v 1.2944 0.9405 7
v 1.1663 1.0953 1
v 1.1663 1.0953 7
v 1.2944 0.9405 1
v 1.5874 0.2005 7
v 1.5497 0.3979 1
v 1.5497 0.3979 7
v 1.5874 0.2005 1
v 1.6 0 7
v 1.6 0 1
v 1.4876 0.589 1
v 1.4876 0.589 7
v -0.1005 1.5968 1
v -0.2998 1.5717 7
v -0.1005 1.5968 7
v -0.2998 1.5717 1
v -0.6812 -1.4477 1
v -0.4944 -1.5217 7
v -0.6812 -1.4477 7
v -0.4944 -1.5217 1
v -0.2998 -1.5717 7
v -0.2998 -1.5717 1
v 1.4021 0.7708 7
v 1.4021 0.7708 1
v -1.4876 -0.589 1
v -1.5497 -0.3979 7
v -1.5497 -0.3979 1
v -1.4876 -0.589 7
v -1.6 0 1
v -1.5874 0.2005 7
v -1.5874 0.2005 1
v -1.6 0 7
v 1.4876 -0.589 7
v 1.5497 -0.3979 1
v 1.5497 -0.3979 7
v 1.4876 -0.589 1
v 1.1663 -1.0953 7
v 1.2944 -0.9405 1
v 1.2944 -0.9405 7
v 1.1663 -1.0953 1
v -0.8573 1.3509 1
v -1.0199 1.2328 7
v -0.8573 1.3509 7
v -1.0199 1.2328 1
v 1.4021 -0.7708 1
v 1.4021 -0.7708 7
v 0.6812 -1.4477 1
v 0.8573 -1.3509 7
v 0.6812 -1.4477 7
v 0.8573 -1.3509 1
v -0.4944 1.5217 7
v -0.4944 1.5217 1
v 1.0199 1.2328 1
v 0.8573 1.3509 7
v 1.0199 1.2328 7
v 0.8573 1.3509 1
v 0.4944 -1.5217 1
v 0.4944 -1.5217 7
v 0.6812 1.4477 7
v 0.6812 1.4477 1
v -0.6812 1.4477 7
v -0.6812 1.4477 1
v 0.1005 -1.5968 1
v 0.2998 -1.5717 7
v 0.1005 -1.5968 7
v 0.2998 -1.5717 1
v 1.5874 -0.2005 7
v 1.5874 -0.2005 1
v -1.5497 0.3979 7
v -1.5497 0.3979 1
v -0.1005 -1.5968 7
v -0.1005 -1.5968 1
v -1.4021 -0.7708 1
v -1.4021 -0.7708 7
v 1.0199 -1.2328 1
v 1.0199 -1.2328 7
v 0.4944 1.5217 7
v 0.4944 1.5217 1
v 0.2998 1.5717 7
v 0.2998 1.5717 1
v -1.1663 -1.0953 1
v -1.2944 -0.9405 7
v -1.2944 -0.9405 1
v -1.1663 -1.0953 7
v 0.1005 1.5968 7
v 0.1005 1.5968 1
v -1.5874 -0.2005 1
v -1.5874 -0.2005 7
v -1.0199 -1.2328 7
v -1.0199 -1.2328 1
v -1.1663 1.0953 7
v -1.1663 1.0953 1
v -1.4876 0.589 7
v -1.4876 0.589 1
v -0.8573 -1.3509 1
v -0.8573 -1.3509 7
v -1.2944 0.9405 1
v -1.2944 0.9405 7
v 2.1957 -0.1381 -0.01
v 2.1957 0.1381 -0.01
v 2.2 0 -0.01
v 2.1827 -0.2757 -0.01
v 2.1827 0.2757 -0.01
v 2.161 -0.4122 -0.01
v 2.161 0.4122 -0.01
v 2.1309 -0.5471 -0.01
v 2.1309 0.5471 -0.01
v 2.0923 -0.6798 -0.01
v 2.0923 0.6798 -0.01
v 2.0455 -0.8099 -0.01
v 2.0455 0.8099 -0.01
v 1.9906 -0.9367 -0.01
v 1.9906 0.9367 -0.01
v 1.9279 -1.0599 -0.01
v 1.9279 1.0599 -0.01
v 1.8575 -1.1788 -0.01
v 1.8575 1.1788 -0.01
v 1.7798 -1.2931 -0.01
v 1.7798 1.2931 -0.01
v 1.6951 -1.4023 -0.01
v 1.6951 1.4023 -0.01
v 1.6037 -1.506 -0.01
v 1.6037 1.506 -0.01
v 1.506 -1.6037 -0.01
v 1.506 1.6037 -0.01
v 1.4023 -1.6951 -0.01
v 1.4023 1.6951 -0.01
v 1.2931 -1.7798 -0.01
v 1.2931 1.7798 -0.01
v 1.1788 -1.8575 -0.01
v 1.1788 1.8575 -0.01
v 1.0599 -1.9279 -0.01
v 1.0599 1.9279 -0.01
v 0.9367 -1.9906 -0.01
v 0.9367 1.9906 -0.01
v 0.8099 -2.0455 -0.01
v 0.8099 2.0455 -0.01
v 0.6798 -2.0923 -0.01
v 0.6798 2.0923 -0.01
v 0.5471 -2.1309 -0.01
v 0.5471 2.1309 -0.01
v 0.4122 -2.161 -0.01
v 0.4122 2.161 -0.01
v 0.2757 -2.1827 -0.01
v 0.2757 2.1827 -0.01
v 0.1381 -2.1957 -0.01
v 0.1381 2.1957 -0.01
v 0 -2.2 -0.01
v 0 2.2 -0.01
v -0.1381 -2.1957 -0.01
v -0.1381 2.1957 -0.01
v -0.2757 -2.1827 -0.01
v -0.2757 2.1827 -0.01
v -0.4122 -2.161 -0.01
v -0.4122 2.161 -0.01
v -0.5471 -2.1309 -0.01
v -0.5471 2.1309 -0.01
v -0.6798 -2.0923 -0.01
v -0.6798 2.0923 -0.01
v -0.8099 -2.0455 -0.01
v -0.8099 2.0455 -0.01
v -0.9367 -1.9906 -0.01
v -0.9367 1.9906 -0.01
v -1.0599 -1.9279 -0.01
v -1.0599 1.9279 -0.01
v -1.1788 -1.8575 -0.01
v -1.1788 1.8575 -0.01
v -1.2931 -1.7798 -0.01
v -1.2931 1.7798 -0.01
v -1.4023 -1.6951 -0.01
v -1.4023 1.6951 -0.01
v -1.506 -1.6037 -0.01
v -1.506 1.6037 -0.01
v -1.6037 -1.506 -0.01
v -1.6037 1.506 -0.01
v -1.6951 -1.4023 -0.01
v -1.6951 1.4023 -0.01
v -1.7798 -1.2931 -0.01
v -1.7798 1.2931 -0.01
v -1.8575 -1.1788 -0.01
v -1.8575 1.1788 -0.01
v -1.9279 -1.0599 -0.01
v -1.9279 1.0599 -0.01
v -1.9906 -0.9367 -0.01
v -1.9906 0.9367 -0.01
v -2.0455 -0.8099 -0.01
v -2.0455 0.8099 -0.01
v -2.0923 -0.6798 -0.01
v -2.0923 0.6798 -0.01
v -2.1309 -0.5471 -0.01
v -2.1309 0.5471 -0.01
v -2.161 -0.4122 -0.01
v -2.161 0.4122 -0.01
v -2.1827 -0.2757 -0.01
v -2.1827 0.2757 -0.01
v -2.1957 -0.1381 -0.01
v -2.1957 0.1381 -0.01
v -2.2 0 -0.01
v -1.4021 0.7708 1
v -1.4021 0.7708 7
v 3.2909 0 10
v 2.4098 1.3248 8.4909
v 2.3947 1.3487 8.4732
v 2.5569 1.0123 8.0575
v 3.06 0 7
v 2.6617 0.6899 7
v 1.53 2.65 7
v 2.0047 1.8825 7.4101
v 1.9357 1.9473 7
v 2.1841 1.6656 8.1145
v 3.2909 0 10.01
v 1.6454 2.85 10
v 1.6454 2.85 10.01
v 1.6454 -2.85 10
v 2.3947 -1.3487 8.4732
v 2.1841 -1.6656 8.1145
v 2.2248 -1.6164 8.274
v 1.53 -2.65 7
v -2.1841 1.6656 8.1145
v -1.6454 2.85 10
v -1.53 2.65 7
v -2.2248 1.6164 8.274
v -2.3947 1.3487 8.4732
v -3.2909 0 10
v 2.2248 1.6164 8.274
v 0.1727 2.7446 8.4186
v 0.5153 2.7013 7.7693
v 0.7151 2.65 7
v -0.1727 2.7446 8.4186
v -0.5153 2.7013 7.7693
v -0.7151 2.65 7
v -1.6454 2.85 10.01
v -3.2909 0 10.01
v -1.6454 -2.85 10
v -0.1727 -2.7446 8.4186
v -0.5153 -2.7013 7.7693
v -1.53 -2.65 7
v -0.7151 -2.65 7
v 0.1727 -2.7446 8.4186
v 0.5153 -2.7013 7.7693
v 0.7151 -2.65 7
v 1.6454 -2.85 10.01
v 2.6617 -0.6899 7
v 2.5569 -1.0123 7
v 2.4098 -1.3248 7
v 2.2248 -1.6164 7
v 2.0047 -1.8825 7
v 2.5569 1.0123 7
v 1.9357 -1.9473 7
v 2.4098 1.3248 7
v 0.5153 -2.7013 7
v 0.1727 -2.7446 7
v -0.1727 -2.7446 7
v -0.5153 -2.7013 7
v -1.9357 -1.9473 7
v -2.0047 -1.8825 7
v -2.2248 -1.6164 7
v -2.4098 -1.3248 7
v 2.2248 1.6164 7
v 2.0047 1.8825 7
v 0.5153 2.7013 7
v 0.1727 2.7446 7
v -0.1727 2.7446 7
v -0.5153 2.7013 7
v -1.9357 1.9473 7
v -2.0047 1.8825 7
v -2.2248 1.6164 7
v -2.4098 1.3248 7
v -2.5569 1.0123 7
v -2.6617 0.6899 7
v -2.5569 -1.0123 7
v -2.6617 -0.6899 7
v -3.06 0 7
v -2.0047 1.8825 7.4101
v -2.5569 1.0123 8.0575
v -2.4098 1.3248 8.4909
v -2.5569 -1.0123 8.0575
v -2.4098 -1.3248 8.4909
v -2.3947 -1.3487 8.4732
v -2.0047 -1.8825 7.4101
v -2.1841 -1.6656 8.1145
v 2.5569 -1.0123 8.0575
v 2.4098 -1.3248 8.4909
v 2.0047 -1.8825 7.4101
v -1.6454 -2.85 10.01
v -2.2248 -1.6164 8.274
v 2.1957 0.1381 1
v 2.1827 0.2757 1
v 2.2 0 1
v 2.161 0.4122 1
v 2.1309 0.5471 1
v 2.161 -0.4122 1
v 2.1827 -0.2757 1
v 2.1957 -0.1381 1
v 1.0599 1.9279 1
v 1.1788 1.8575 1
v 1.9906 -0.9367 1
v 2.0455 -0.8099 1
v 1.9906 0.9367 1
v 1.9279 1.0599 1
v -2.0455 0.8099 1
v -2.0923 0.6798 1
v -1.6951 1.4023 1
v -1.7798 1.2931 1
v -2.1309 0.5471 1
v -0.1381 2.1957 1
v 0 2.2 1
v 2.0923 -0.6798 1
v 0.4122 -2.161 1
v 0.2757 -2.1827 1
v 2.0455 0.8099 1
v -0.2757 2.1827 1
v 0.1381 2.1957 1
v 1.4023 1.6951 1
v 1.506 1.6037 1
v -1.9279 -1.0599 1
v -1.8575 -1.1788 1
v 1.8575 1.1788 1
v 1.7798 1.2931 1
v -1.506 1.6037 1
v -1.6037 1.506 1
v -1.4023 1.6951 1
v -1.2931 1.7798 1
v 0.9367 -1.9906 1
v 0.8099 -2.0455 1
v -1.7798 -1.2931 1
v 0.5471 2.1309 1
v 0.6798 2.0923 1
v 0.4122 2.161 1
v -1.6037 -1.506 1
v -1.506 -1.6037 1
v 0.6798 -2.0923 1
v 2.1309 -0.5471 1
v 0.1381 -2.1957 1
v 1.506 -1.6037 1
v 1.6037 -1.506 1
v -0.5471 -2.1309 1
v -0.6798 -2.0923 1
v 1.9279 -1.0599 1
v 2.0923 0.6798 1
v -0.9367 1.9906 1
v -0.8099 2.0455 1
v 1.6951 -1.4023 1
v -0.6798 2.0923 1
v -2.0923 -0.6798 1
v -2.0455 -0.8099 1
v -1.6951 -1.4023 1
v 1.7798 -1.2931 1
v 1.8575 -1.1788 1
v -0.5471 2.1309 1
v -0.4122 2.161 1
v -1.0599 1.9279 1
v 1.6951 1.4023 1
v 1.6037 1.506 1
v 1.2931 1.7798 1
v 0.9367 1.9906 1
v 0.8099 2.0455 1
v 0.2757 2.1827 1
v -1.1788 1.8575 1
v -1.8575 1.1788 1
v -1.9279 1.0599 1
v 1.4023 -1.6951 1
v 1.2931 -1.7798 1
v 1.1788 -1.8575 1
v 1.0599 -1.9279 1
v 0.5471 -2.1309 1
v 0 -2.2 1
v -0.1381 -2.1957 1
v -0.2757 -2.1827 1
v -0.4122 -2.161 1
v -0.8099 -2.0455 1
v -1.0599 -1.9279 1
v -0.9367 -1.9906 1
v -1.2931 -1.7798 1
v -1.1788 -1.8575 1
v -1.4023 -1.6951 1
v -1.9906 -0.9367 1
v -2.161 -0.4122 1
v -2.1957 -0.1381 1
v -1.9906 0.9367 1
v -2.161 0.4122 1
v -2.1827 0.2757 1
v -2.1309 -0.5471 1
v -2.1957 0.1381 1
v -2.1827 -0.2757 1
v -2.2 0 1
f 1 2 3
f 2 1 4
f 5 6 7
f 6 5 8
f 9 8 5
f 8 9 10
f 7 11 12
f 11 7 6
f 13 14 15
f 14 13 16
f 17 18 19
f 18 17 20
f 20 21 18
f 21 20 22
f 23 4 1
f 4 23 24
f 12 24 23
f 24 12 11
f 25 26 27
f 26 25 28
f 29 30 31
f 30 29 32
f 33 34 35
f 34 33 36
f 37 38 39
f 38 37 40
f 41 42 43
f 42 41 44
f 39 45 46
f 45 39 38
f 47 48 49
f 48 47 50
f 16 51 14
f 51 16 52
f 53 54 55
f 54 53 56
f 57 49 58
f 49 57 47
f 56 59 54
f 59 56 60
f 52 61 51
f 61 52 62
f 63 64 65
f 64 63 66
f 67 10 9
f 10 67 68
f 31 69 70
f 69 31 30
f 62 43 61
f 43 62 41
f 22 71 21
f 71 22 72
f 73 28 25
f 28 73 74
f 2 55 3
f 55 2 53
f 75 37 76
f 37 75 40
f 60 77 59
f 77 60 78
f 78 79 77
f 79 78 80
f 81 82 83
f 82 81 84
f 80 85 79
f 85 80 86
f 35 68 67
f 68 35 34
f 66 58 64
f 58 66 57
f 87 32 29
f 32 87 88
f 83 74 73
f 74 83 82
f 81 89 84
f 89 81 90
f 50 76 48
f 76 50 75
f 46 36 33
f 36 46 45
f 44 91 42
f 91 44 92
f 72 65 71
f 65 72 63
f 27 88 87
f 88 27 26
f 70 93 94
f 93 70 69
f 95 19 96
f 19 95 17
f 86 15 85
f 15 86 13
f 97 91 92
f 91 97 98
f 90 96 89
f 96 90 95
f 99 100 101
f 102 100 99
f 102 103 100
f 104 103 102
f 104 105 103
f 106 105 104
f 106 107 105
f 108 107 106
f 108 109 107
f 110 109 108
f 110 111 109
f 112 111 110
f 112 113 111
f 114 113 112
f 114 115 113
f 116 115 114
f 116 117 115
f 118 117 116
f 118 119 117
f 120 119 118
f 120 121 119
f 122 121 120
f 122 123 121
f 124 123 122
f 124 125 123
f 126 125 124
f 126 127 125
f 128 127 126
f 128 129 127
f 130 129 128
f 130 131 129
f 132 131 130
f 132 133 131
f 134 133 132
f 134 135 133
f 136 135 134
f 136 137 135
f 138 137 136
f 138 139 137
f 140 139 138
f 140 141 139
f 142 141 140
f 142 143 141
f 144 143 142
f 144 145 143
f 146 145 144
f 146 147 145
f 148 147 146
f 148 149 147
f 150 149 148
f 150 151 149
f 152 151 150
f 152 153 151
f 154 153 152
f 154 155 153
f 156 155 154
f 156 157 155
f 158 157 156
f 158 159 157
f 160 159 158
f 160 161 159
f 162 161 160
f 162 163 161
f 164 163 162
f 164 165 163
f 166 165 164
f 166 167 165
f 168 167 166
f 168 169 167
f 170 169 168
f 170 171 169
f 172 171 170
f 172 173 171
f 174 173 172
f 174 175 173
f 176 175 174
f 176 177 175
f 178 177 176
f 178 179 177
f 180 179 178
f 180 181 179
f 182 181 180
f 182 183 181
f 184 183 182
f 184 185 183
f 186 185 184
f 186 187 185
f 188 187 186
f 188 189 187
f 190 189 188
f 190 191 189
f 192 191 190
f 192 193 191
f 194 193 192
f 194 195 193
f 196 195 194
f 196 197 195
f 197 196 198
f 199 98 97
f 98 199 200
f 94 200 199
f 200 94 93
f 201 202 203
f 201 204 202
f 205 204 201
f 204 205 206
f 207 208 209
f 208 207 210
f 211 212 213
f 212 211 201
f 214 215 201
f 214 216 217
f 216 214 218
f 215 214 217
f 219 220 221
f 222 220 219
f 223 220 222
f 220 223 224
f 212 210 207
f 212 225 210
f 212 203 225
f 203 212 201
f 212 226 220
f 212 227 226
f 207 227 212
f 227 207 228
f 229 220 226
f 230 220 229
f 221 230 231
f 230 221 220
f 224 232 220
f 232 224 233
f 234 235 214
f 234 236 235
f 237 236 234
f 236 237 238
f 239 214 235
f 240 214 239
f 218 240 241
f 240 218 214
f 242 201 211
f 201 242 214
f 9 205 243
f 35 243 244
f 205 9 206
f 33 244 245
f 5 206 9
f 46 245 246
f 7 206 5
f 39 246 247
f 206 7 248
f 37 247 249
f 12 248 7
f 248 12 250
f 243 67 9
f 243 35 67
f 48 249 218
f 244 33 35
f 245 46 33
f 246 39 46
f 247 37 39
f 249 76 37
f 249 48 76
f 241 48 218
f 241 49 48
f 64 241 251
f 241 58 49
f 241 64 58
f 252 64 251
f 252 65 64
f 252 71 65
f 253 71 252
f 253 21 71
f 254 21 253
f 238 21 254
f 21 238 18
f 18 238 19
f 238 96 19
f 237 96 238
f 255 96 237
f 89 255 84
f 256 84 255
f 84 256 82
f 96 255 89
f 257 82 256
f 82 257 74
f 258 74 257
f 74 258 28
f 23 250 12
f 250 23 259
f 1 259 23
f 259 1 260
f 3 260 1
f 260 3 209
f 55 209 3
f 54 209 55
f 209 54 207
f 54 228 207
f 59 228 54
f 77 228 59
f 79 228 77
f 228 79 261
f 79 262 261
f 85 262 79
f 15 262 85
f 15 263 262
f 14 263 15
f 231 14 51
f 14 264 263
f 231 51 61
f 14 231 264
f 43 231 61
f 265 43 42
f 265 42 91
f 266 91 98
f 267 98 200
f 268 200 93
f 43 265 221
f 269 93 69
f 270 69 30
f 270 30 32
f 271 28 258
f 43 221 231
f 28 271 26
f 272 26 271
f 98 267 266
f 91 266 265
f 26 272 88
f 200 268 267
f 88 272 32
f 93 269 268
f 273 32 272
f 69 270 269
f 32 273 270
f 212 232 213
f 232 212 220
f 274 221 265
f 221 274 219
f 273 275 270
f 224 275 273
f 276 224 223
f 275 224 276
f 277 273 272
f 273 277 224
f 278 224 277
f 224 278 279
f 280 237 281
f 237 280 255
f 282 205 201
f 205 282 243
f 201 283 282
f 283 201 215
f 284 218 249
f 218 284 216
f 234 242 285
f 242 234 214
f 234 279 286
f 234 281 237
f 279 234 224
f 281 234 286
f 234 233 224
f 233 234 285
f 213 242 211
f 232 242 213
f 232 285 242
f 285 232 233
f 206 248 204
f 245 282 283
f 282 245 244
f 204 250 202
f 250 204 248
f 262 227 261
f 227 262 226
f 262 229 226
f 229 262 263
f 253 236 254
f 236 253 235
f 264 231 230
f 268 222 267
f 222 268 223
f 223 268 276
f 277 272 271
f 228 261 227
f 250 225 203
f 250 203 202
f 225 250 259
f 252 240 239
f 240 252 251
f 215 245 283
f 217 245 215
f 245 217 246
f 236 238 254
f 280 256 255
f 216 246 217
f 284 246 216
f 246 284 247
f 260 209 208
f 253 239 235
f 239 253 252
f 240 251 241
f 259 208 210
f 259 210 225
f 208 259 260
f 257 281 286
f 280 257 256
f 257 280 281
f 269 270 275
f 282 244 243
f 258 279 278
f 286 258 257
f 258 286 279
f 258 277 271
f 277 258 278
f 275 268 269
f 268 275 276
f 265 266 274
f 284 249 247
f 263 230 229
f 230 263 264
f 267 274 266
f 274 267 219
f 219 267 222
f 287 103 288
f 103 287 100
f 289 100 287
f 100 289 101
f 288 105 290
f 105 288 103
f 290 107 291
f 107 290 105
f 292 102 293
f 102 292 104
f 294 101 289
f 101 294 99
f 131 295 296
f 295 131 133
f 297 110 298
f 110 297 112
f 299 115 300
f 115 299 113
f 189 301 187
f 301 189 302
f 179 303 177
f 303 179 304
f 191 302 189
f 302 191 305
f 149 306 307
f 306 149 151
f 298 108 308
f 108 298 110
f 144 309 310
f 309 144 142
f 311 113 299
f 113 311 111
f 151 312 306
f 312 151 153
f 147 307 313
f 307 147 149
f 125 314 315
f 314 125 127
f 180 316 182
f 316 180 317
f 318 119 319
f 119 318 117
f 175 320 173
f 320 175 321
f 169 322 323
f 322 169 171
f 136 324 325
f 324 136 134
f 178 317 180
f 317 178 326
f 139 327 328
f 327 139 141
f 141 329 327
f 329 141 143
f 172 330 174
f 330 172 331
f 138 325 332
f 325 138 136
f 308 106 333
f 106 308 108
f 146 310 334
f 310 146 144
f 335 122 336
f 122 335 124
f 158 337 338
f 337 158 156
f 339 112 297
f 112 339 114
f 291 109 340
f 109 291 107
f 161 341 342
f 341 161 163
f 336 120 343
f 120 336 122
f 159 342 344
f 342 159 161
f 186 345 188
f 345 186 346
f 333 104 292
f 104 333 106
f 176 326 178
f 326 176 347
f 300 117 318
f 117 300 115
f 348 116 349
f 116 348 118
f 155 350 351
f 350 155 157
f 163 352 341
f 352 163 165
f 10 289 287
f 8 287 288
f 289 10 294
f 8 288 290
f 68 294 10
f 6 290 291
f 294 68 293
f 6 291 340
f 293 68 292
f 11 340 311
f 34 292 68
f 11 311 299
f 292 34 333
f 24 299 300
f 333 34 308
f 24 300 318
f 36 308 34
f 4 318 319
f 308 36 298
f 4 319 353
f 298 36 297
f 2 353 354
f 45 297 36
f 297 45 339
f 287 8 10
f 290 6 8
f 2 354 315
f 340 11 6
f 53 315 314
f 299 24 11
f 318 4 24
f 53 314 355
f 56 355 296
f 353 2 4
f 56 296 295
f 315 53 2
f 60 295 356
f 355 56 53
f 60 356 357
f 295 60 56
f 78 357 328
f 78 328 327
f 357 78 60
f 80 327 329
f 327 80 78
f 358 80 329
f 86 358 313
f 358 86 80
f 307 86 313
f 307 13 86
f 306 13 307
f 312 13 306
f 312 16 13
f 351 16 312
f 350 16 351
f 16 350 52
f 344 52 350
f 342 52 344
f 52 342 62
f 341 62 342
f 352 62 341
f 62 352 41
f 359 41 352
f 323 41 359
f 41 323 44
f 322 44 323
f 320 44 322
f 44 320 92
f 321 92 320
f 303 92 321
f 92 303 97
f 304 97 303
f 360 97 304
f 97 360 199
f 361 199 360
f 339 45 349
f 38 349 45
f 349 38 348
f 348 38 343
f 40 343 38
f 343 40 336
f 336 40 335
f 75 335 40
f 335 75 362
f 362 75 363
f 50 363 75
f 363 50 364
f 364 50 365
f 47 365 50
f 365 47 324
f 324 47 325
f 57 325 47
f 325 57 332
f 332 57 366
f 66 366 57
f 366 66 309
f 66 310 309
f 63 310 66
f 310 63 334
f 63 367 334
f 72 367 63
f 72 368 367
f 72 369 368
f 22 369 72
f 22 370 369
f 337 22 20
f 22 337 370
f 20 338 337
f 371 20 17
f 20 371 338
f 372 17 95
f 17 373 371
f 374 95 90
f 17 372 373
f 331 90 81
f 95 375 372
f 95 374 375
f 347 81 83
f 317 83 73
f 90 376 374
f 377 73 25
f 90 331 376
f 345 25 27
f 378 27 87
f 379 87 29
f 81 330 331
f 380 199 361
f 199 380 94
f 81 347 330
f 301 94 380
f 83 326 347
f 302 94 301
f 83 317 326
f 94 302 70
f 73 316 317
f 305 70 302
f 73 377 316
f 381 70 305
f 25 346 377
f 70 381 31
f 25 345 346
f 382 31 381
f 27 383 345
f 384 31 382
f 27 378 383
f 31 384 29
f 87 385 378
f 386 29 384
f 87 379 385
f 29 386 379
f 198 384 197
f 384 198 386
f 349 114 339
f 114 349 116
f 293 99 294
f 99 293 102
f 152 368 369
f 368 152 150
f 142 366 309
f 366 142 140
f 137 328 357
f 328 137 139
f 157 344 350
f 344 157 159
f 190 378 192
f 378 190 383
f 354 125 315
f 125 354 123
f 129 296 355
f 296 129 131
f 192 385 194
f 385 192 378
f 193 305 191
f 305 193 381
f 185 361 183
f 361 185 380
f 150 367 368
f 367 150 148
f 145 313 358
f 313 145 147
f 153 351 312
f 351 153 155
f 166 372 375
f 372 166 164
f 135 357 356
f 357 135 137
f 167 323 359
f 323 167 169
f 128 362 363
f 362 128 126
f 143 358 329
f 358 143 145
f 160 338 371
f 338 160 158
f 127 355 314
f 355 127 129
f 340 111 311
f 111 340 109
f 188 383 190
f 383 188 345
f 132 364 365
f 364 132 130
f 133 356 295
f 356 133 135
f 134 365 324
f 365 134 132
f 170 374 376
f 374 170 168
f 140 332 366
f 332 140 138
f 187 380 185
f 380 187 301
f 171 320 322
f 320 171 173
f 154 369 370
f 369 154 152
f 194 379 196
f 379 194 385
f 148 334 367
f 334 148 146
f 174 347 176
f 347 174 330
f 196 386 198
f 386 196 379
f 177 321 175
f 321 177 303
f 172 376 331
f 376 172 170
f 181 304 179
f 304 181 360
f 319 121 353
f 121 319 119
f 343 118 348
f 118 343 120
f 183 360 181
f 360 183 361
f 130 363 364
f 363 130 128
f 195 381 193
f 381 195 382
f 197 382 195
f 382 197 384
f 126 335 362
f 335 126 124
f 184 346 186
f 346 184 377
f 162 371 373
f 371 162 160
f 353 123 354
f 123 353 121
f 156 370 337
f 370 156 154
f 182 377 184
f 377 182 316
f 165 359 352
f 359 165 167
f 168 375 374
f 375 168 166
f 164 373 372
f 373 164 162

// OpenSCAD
// file: hexagon.scad
module hexagon(inradius) {
    circle(r=2 * inradius / sqrt(3), $fn=6);
}

hexagon(inradius=2.8);
// main file
use <hexagon.scad>

module screw_hole_m3(h) {
    // Through screw hole
    translate([0, 0, -0.01])
    cylinder(h=h, d=3.2, $fn=50);

    // Hex nut cutout 
    translate([0, 0, h - 3])
    hull() {
        // Large hex nut
        translate([0, 0, 3])
        linear_extrude(0.01)
        hexagon(inradius=2.85);

        // Small hex nut
        linear_extrude(0.01)
        hexagon(inradius=2.65);
    }

    // Screw head cutout
    translate([0, 0, h - 3])
    cylinder(h=2.61, d=5.5, $fn=50);

    // Bottom screw thread protrusion cutout
    translate([0, 0, -0.01])
    cylinder(h=1.01, d=4.4, $fn=100);
}

screw_hole_m3(h=10);
